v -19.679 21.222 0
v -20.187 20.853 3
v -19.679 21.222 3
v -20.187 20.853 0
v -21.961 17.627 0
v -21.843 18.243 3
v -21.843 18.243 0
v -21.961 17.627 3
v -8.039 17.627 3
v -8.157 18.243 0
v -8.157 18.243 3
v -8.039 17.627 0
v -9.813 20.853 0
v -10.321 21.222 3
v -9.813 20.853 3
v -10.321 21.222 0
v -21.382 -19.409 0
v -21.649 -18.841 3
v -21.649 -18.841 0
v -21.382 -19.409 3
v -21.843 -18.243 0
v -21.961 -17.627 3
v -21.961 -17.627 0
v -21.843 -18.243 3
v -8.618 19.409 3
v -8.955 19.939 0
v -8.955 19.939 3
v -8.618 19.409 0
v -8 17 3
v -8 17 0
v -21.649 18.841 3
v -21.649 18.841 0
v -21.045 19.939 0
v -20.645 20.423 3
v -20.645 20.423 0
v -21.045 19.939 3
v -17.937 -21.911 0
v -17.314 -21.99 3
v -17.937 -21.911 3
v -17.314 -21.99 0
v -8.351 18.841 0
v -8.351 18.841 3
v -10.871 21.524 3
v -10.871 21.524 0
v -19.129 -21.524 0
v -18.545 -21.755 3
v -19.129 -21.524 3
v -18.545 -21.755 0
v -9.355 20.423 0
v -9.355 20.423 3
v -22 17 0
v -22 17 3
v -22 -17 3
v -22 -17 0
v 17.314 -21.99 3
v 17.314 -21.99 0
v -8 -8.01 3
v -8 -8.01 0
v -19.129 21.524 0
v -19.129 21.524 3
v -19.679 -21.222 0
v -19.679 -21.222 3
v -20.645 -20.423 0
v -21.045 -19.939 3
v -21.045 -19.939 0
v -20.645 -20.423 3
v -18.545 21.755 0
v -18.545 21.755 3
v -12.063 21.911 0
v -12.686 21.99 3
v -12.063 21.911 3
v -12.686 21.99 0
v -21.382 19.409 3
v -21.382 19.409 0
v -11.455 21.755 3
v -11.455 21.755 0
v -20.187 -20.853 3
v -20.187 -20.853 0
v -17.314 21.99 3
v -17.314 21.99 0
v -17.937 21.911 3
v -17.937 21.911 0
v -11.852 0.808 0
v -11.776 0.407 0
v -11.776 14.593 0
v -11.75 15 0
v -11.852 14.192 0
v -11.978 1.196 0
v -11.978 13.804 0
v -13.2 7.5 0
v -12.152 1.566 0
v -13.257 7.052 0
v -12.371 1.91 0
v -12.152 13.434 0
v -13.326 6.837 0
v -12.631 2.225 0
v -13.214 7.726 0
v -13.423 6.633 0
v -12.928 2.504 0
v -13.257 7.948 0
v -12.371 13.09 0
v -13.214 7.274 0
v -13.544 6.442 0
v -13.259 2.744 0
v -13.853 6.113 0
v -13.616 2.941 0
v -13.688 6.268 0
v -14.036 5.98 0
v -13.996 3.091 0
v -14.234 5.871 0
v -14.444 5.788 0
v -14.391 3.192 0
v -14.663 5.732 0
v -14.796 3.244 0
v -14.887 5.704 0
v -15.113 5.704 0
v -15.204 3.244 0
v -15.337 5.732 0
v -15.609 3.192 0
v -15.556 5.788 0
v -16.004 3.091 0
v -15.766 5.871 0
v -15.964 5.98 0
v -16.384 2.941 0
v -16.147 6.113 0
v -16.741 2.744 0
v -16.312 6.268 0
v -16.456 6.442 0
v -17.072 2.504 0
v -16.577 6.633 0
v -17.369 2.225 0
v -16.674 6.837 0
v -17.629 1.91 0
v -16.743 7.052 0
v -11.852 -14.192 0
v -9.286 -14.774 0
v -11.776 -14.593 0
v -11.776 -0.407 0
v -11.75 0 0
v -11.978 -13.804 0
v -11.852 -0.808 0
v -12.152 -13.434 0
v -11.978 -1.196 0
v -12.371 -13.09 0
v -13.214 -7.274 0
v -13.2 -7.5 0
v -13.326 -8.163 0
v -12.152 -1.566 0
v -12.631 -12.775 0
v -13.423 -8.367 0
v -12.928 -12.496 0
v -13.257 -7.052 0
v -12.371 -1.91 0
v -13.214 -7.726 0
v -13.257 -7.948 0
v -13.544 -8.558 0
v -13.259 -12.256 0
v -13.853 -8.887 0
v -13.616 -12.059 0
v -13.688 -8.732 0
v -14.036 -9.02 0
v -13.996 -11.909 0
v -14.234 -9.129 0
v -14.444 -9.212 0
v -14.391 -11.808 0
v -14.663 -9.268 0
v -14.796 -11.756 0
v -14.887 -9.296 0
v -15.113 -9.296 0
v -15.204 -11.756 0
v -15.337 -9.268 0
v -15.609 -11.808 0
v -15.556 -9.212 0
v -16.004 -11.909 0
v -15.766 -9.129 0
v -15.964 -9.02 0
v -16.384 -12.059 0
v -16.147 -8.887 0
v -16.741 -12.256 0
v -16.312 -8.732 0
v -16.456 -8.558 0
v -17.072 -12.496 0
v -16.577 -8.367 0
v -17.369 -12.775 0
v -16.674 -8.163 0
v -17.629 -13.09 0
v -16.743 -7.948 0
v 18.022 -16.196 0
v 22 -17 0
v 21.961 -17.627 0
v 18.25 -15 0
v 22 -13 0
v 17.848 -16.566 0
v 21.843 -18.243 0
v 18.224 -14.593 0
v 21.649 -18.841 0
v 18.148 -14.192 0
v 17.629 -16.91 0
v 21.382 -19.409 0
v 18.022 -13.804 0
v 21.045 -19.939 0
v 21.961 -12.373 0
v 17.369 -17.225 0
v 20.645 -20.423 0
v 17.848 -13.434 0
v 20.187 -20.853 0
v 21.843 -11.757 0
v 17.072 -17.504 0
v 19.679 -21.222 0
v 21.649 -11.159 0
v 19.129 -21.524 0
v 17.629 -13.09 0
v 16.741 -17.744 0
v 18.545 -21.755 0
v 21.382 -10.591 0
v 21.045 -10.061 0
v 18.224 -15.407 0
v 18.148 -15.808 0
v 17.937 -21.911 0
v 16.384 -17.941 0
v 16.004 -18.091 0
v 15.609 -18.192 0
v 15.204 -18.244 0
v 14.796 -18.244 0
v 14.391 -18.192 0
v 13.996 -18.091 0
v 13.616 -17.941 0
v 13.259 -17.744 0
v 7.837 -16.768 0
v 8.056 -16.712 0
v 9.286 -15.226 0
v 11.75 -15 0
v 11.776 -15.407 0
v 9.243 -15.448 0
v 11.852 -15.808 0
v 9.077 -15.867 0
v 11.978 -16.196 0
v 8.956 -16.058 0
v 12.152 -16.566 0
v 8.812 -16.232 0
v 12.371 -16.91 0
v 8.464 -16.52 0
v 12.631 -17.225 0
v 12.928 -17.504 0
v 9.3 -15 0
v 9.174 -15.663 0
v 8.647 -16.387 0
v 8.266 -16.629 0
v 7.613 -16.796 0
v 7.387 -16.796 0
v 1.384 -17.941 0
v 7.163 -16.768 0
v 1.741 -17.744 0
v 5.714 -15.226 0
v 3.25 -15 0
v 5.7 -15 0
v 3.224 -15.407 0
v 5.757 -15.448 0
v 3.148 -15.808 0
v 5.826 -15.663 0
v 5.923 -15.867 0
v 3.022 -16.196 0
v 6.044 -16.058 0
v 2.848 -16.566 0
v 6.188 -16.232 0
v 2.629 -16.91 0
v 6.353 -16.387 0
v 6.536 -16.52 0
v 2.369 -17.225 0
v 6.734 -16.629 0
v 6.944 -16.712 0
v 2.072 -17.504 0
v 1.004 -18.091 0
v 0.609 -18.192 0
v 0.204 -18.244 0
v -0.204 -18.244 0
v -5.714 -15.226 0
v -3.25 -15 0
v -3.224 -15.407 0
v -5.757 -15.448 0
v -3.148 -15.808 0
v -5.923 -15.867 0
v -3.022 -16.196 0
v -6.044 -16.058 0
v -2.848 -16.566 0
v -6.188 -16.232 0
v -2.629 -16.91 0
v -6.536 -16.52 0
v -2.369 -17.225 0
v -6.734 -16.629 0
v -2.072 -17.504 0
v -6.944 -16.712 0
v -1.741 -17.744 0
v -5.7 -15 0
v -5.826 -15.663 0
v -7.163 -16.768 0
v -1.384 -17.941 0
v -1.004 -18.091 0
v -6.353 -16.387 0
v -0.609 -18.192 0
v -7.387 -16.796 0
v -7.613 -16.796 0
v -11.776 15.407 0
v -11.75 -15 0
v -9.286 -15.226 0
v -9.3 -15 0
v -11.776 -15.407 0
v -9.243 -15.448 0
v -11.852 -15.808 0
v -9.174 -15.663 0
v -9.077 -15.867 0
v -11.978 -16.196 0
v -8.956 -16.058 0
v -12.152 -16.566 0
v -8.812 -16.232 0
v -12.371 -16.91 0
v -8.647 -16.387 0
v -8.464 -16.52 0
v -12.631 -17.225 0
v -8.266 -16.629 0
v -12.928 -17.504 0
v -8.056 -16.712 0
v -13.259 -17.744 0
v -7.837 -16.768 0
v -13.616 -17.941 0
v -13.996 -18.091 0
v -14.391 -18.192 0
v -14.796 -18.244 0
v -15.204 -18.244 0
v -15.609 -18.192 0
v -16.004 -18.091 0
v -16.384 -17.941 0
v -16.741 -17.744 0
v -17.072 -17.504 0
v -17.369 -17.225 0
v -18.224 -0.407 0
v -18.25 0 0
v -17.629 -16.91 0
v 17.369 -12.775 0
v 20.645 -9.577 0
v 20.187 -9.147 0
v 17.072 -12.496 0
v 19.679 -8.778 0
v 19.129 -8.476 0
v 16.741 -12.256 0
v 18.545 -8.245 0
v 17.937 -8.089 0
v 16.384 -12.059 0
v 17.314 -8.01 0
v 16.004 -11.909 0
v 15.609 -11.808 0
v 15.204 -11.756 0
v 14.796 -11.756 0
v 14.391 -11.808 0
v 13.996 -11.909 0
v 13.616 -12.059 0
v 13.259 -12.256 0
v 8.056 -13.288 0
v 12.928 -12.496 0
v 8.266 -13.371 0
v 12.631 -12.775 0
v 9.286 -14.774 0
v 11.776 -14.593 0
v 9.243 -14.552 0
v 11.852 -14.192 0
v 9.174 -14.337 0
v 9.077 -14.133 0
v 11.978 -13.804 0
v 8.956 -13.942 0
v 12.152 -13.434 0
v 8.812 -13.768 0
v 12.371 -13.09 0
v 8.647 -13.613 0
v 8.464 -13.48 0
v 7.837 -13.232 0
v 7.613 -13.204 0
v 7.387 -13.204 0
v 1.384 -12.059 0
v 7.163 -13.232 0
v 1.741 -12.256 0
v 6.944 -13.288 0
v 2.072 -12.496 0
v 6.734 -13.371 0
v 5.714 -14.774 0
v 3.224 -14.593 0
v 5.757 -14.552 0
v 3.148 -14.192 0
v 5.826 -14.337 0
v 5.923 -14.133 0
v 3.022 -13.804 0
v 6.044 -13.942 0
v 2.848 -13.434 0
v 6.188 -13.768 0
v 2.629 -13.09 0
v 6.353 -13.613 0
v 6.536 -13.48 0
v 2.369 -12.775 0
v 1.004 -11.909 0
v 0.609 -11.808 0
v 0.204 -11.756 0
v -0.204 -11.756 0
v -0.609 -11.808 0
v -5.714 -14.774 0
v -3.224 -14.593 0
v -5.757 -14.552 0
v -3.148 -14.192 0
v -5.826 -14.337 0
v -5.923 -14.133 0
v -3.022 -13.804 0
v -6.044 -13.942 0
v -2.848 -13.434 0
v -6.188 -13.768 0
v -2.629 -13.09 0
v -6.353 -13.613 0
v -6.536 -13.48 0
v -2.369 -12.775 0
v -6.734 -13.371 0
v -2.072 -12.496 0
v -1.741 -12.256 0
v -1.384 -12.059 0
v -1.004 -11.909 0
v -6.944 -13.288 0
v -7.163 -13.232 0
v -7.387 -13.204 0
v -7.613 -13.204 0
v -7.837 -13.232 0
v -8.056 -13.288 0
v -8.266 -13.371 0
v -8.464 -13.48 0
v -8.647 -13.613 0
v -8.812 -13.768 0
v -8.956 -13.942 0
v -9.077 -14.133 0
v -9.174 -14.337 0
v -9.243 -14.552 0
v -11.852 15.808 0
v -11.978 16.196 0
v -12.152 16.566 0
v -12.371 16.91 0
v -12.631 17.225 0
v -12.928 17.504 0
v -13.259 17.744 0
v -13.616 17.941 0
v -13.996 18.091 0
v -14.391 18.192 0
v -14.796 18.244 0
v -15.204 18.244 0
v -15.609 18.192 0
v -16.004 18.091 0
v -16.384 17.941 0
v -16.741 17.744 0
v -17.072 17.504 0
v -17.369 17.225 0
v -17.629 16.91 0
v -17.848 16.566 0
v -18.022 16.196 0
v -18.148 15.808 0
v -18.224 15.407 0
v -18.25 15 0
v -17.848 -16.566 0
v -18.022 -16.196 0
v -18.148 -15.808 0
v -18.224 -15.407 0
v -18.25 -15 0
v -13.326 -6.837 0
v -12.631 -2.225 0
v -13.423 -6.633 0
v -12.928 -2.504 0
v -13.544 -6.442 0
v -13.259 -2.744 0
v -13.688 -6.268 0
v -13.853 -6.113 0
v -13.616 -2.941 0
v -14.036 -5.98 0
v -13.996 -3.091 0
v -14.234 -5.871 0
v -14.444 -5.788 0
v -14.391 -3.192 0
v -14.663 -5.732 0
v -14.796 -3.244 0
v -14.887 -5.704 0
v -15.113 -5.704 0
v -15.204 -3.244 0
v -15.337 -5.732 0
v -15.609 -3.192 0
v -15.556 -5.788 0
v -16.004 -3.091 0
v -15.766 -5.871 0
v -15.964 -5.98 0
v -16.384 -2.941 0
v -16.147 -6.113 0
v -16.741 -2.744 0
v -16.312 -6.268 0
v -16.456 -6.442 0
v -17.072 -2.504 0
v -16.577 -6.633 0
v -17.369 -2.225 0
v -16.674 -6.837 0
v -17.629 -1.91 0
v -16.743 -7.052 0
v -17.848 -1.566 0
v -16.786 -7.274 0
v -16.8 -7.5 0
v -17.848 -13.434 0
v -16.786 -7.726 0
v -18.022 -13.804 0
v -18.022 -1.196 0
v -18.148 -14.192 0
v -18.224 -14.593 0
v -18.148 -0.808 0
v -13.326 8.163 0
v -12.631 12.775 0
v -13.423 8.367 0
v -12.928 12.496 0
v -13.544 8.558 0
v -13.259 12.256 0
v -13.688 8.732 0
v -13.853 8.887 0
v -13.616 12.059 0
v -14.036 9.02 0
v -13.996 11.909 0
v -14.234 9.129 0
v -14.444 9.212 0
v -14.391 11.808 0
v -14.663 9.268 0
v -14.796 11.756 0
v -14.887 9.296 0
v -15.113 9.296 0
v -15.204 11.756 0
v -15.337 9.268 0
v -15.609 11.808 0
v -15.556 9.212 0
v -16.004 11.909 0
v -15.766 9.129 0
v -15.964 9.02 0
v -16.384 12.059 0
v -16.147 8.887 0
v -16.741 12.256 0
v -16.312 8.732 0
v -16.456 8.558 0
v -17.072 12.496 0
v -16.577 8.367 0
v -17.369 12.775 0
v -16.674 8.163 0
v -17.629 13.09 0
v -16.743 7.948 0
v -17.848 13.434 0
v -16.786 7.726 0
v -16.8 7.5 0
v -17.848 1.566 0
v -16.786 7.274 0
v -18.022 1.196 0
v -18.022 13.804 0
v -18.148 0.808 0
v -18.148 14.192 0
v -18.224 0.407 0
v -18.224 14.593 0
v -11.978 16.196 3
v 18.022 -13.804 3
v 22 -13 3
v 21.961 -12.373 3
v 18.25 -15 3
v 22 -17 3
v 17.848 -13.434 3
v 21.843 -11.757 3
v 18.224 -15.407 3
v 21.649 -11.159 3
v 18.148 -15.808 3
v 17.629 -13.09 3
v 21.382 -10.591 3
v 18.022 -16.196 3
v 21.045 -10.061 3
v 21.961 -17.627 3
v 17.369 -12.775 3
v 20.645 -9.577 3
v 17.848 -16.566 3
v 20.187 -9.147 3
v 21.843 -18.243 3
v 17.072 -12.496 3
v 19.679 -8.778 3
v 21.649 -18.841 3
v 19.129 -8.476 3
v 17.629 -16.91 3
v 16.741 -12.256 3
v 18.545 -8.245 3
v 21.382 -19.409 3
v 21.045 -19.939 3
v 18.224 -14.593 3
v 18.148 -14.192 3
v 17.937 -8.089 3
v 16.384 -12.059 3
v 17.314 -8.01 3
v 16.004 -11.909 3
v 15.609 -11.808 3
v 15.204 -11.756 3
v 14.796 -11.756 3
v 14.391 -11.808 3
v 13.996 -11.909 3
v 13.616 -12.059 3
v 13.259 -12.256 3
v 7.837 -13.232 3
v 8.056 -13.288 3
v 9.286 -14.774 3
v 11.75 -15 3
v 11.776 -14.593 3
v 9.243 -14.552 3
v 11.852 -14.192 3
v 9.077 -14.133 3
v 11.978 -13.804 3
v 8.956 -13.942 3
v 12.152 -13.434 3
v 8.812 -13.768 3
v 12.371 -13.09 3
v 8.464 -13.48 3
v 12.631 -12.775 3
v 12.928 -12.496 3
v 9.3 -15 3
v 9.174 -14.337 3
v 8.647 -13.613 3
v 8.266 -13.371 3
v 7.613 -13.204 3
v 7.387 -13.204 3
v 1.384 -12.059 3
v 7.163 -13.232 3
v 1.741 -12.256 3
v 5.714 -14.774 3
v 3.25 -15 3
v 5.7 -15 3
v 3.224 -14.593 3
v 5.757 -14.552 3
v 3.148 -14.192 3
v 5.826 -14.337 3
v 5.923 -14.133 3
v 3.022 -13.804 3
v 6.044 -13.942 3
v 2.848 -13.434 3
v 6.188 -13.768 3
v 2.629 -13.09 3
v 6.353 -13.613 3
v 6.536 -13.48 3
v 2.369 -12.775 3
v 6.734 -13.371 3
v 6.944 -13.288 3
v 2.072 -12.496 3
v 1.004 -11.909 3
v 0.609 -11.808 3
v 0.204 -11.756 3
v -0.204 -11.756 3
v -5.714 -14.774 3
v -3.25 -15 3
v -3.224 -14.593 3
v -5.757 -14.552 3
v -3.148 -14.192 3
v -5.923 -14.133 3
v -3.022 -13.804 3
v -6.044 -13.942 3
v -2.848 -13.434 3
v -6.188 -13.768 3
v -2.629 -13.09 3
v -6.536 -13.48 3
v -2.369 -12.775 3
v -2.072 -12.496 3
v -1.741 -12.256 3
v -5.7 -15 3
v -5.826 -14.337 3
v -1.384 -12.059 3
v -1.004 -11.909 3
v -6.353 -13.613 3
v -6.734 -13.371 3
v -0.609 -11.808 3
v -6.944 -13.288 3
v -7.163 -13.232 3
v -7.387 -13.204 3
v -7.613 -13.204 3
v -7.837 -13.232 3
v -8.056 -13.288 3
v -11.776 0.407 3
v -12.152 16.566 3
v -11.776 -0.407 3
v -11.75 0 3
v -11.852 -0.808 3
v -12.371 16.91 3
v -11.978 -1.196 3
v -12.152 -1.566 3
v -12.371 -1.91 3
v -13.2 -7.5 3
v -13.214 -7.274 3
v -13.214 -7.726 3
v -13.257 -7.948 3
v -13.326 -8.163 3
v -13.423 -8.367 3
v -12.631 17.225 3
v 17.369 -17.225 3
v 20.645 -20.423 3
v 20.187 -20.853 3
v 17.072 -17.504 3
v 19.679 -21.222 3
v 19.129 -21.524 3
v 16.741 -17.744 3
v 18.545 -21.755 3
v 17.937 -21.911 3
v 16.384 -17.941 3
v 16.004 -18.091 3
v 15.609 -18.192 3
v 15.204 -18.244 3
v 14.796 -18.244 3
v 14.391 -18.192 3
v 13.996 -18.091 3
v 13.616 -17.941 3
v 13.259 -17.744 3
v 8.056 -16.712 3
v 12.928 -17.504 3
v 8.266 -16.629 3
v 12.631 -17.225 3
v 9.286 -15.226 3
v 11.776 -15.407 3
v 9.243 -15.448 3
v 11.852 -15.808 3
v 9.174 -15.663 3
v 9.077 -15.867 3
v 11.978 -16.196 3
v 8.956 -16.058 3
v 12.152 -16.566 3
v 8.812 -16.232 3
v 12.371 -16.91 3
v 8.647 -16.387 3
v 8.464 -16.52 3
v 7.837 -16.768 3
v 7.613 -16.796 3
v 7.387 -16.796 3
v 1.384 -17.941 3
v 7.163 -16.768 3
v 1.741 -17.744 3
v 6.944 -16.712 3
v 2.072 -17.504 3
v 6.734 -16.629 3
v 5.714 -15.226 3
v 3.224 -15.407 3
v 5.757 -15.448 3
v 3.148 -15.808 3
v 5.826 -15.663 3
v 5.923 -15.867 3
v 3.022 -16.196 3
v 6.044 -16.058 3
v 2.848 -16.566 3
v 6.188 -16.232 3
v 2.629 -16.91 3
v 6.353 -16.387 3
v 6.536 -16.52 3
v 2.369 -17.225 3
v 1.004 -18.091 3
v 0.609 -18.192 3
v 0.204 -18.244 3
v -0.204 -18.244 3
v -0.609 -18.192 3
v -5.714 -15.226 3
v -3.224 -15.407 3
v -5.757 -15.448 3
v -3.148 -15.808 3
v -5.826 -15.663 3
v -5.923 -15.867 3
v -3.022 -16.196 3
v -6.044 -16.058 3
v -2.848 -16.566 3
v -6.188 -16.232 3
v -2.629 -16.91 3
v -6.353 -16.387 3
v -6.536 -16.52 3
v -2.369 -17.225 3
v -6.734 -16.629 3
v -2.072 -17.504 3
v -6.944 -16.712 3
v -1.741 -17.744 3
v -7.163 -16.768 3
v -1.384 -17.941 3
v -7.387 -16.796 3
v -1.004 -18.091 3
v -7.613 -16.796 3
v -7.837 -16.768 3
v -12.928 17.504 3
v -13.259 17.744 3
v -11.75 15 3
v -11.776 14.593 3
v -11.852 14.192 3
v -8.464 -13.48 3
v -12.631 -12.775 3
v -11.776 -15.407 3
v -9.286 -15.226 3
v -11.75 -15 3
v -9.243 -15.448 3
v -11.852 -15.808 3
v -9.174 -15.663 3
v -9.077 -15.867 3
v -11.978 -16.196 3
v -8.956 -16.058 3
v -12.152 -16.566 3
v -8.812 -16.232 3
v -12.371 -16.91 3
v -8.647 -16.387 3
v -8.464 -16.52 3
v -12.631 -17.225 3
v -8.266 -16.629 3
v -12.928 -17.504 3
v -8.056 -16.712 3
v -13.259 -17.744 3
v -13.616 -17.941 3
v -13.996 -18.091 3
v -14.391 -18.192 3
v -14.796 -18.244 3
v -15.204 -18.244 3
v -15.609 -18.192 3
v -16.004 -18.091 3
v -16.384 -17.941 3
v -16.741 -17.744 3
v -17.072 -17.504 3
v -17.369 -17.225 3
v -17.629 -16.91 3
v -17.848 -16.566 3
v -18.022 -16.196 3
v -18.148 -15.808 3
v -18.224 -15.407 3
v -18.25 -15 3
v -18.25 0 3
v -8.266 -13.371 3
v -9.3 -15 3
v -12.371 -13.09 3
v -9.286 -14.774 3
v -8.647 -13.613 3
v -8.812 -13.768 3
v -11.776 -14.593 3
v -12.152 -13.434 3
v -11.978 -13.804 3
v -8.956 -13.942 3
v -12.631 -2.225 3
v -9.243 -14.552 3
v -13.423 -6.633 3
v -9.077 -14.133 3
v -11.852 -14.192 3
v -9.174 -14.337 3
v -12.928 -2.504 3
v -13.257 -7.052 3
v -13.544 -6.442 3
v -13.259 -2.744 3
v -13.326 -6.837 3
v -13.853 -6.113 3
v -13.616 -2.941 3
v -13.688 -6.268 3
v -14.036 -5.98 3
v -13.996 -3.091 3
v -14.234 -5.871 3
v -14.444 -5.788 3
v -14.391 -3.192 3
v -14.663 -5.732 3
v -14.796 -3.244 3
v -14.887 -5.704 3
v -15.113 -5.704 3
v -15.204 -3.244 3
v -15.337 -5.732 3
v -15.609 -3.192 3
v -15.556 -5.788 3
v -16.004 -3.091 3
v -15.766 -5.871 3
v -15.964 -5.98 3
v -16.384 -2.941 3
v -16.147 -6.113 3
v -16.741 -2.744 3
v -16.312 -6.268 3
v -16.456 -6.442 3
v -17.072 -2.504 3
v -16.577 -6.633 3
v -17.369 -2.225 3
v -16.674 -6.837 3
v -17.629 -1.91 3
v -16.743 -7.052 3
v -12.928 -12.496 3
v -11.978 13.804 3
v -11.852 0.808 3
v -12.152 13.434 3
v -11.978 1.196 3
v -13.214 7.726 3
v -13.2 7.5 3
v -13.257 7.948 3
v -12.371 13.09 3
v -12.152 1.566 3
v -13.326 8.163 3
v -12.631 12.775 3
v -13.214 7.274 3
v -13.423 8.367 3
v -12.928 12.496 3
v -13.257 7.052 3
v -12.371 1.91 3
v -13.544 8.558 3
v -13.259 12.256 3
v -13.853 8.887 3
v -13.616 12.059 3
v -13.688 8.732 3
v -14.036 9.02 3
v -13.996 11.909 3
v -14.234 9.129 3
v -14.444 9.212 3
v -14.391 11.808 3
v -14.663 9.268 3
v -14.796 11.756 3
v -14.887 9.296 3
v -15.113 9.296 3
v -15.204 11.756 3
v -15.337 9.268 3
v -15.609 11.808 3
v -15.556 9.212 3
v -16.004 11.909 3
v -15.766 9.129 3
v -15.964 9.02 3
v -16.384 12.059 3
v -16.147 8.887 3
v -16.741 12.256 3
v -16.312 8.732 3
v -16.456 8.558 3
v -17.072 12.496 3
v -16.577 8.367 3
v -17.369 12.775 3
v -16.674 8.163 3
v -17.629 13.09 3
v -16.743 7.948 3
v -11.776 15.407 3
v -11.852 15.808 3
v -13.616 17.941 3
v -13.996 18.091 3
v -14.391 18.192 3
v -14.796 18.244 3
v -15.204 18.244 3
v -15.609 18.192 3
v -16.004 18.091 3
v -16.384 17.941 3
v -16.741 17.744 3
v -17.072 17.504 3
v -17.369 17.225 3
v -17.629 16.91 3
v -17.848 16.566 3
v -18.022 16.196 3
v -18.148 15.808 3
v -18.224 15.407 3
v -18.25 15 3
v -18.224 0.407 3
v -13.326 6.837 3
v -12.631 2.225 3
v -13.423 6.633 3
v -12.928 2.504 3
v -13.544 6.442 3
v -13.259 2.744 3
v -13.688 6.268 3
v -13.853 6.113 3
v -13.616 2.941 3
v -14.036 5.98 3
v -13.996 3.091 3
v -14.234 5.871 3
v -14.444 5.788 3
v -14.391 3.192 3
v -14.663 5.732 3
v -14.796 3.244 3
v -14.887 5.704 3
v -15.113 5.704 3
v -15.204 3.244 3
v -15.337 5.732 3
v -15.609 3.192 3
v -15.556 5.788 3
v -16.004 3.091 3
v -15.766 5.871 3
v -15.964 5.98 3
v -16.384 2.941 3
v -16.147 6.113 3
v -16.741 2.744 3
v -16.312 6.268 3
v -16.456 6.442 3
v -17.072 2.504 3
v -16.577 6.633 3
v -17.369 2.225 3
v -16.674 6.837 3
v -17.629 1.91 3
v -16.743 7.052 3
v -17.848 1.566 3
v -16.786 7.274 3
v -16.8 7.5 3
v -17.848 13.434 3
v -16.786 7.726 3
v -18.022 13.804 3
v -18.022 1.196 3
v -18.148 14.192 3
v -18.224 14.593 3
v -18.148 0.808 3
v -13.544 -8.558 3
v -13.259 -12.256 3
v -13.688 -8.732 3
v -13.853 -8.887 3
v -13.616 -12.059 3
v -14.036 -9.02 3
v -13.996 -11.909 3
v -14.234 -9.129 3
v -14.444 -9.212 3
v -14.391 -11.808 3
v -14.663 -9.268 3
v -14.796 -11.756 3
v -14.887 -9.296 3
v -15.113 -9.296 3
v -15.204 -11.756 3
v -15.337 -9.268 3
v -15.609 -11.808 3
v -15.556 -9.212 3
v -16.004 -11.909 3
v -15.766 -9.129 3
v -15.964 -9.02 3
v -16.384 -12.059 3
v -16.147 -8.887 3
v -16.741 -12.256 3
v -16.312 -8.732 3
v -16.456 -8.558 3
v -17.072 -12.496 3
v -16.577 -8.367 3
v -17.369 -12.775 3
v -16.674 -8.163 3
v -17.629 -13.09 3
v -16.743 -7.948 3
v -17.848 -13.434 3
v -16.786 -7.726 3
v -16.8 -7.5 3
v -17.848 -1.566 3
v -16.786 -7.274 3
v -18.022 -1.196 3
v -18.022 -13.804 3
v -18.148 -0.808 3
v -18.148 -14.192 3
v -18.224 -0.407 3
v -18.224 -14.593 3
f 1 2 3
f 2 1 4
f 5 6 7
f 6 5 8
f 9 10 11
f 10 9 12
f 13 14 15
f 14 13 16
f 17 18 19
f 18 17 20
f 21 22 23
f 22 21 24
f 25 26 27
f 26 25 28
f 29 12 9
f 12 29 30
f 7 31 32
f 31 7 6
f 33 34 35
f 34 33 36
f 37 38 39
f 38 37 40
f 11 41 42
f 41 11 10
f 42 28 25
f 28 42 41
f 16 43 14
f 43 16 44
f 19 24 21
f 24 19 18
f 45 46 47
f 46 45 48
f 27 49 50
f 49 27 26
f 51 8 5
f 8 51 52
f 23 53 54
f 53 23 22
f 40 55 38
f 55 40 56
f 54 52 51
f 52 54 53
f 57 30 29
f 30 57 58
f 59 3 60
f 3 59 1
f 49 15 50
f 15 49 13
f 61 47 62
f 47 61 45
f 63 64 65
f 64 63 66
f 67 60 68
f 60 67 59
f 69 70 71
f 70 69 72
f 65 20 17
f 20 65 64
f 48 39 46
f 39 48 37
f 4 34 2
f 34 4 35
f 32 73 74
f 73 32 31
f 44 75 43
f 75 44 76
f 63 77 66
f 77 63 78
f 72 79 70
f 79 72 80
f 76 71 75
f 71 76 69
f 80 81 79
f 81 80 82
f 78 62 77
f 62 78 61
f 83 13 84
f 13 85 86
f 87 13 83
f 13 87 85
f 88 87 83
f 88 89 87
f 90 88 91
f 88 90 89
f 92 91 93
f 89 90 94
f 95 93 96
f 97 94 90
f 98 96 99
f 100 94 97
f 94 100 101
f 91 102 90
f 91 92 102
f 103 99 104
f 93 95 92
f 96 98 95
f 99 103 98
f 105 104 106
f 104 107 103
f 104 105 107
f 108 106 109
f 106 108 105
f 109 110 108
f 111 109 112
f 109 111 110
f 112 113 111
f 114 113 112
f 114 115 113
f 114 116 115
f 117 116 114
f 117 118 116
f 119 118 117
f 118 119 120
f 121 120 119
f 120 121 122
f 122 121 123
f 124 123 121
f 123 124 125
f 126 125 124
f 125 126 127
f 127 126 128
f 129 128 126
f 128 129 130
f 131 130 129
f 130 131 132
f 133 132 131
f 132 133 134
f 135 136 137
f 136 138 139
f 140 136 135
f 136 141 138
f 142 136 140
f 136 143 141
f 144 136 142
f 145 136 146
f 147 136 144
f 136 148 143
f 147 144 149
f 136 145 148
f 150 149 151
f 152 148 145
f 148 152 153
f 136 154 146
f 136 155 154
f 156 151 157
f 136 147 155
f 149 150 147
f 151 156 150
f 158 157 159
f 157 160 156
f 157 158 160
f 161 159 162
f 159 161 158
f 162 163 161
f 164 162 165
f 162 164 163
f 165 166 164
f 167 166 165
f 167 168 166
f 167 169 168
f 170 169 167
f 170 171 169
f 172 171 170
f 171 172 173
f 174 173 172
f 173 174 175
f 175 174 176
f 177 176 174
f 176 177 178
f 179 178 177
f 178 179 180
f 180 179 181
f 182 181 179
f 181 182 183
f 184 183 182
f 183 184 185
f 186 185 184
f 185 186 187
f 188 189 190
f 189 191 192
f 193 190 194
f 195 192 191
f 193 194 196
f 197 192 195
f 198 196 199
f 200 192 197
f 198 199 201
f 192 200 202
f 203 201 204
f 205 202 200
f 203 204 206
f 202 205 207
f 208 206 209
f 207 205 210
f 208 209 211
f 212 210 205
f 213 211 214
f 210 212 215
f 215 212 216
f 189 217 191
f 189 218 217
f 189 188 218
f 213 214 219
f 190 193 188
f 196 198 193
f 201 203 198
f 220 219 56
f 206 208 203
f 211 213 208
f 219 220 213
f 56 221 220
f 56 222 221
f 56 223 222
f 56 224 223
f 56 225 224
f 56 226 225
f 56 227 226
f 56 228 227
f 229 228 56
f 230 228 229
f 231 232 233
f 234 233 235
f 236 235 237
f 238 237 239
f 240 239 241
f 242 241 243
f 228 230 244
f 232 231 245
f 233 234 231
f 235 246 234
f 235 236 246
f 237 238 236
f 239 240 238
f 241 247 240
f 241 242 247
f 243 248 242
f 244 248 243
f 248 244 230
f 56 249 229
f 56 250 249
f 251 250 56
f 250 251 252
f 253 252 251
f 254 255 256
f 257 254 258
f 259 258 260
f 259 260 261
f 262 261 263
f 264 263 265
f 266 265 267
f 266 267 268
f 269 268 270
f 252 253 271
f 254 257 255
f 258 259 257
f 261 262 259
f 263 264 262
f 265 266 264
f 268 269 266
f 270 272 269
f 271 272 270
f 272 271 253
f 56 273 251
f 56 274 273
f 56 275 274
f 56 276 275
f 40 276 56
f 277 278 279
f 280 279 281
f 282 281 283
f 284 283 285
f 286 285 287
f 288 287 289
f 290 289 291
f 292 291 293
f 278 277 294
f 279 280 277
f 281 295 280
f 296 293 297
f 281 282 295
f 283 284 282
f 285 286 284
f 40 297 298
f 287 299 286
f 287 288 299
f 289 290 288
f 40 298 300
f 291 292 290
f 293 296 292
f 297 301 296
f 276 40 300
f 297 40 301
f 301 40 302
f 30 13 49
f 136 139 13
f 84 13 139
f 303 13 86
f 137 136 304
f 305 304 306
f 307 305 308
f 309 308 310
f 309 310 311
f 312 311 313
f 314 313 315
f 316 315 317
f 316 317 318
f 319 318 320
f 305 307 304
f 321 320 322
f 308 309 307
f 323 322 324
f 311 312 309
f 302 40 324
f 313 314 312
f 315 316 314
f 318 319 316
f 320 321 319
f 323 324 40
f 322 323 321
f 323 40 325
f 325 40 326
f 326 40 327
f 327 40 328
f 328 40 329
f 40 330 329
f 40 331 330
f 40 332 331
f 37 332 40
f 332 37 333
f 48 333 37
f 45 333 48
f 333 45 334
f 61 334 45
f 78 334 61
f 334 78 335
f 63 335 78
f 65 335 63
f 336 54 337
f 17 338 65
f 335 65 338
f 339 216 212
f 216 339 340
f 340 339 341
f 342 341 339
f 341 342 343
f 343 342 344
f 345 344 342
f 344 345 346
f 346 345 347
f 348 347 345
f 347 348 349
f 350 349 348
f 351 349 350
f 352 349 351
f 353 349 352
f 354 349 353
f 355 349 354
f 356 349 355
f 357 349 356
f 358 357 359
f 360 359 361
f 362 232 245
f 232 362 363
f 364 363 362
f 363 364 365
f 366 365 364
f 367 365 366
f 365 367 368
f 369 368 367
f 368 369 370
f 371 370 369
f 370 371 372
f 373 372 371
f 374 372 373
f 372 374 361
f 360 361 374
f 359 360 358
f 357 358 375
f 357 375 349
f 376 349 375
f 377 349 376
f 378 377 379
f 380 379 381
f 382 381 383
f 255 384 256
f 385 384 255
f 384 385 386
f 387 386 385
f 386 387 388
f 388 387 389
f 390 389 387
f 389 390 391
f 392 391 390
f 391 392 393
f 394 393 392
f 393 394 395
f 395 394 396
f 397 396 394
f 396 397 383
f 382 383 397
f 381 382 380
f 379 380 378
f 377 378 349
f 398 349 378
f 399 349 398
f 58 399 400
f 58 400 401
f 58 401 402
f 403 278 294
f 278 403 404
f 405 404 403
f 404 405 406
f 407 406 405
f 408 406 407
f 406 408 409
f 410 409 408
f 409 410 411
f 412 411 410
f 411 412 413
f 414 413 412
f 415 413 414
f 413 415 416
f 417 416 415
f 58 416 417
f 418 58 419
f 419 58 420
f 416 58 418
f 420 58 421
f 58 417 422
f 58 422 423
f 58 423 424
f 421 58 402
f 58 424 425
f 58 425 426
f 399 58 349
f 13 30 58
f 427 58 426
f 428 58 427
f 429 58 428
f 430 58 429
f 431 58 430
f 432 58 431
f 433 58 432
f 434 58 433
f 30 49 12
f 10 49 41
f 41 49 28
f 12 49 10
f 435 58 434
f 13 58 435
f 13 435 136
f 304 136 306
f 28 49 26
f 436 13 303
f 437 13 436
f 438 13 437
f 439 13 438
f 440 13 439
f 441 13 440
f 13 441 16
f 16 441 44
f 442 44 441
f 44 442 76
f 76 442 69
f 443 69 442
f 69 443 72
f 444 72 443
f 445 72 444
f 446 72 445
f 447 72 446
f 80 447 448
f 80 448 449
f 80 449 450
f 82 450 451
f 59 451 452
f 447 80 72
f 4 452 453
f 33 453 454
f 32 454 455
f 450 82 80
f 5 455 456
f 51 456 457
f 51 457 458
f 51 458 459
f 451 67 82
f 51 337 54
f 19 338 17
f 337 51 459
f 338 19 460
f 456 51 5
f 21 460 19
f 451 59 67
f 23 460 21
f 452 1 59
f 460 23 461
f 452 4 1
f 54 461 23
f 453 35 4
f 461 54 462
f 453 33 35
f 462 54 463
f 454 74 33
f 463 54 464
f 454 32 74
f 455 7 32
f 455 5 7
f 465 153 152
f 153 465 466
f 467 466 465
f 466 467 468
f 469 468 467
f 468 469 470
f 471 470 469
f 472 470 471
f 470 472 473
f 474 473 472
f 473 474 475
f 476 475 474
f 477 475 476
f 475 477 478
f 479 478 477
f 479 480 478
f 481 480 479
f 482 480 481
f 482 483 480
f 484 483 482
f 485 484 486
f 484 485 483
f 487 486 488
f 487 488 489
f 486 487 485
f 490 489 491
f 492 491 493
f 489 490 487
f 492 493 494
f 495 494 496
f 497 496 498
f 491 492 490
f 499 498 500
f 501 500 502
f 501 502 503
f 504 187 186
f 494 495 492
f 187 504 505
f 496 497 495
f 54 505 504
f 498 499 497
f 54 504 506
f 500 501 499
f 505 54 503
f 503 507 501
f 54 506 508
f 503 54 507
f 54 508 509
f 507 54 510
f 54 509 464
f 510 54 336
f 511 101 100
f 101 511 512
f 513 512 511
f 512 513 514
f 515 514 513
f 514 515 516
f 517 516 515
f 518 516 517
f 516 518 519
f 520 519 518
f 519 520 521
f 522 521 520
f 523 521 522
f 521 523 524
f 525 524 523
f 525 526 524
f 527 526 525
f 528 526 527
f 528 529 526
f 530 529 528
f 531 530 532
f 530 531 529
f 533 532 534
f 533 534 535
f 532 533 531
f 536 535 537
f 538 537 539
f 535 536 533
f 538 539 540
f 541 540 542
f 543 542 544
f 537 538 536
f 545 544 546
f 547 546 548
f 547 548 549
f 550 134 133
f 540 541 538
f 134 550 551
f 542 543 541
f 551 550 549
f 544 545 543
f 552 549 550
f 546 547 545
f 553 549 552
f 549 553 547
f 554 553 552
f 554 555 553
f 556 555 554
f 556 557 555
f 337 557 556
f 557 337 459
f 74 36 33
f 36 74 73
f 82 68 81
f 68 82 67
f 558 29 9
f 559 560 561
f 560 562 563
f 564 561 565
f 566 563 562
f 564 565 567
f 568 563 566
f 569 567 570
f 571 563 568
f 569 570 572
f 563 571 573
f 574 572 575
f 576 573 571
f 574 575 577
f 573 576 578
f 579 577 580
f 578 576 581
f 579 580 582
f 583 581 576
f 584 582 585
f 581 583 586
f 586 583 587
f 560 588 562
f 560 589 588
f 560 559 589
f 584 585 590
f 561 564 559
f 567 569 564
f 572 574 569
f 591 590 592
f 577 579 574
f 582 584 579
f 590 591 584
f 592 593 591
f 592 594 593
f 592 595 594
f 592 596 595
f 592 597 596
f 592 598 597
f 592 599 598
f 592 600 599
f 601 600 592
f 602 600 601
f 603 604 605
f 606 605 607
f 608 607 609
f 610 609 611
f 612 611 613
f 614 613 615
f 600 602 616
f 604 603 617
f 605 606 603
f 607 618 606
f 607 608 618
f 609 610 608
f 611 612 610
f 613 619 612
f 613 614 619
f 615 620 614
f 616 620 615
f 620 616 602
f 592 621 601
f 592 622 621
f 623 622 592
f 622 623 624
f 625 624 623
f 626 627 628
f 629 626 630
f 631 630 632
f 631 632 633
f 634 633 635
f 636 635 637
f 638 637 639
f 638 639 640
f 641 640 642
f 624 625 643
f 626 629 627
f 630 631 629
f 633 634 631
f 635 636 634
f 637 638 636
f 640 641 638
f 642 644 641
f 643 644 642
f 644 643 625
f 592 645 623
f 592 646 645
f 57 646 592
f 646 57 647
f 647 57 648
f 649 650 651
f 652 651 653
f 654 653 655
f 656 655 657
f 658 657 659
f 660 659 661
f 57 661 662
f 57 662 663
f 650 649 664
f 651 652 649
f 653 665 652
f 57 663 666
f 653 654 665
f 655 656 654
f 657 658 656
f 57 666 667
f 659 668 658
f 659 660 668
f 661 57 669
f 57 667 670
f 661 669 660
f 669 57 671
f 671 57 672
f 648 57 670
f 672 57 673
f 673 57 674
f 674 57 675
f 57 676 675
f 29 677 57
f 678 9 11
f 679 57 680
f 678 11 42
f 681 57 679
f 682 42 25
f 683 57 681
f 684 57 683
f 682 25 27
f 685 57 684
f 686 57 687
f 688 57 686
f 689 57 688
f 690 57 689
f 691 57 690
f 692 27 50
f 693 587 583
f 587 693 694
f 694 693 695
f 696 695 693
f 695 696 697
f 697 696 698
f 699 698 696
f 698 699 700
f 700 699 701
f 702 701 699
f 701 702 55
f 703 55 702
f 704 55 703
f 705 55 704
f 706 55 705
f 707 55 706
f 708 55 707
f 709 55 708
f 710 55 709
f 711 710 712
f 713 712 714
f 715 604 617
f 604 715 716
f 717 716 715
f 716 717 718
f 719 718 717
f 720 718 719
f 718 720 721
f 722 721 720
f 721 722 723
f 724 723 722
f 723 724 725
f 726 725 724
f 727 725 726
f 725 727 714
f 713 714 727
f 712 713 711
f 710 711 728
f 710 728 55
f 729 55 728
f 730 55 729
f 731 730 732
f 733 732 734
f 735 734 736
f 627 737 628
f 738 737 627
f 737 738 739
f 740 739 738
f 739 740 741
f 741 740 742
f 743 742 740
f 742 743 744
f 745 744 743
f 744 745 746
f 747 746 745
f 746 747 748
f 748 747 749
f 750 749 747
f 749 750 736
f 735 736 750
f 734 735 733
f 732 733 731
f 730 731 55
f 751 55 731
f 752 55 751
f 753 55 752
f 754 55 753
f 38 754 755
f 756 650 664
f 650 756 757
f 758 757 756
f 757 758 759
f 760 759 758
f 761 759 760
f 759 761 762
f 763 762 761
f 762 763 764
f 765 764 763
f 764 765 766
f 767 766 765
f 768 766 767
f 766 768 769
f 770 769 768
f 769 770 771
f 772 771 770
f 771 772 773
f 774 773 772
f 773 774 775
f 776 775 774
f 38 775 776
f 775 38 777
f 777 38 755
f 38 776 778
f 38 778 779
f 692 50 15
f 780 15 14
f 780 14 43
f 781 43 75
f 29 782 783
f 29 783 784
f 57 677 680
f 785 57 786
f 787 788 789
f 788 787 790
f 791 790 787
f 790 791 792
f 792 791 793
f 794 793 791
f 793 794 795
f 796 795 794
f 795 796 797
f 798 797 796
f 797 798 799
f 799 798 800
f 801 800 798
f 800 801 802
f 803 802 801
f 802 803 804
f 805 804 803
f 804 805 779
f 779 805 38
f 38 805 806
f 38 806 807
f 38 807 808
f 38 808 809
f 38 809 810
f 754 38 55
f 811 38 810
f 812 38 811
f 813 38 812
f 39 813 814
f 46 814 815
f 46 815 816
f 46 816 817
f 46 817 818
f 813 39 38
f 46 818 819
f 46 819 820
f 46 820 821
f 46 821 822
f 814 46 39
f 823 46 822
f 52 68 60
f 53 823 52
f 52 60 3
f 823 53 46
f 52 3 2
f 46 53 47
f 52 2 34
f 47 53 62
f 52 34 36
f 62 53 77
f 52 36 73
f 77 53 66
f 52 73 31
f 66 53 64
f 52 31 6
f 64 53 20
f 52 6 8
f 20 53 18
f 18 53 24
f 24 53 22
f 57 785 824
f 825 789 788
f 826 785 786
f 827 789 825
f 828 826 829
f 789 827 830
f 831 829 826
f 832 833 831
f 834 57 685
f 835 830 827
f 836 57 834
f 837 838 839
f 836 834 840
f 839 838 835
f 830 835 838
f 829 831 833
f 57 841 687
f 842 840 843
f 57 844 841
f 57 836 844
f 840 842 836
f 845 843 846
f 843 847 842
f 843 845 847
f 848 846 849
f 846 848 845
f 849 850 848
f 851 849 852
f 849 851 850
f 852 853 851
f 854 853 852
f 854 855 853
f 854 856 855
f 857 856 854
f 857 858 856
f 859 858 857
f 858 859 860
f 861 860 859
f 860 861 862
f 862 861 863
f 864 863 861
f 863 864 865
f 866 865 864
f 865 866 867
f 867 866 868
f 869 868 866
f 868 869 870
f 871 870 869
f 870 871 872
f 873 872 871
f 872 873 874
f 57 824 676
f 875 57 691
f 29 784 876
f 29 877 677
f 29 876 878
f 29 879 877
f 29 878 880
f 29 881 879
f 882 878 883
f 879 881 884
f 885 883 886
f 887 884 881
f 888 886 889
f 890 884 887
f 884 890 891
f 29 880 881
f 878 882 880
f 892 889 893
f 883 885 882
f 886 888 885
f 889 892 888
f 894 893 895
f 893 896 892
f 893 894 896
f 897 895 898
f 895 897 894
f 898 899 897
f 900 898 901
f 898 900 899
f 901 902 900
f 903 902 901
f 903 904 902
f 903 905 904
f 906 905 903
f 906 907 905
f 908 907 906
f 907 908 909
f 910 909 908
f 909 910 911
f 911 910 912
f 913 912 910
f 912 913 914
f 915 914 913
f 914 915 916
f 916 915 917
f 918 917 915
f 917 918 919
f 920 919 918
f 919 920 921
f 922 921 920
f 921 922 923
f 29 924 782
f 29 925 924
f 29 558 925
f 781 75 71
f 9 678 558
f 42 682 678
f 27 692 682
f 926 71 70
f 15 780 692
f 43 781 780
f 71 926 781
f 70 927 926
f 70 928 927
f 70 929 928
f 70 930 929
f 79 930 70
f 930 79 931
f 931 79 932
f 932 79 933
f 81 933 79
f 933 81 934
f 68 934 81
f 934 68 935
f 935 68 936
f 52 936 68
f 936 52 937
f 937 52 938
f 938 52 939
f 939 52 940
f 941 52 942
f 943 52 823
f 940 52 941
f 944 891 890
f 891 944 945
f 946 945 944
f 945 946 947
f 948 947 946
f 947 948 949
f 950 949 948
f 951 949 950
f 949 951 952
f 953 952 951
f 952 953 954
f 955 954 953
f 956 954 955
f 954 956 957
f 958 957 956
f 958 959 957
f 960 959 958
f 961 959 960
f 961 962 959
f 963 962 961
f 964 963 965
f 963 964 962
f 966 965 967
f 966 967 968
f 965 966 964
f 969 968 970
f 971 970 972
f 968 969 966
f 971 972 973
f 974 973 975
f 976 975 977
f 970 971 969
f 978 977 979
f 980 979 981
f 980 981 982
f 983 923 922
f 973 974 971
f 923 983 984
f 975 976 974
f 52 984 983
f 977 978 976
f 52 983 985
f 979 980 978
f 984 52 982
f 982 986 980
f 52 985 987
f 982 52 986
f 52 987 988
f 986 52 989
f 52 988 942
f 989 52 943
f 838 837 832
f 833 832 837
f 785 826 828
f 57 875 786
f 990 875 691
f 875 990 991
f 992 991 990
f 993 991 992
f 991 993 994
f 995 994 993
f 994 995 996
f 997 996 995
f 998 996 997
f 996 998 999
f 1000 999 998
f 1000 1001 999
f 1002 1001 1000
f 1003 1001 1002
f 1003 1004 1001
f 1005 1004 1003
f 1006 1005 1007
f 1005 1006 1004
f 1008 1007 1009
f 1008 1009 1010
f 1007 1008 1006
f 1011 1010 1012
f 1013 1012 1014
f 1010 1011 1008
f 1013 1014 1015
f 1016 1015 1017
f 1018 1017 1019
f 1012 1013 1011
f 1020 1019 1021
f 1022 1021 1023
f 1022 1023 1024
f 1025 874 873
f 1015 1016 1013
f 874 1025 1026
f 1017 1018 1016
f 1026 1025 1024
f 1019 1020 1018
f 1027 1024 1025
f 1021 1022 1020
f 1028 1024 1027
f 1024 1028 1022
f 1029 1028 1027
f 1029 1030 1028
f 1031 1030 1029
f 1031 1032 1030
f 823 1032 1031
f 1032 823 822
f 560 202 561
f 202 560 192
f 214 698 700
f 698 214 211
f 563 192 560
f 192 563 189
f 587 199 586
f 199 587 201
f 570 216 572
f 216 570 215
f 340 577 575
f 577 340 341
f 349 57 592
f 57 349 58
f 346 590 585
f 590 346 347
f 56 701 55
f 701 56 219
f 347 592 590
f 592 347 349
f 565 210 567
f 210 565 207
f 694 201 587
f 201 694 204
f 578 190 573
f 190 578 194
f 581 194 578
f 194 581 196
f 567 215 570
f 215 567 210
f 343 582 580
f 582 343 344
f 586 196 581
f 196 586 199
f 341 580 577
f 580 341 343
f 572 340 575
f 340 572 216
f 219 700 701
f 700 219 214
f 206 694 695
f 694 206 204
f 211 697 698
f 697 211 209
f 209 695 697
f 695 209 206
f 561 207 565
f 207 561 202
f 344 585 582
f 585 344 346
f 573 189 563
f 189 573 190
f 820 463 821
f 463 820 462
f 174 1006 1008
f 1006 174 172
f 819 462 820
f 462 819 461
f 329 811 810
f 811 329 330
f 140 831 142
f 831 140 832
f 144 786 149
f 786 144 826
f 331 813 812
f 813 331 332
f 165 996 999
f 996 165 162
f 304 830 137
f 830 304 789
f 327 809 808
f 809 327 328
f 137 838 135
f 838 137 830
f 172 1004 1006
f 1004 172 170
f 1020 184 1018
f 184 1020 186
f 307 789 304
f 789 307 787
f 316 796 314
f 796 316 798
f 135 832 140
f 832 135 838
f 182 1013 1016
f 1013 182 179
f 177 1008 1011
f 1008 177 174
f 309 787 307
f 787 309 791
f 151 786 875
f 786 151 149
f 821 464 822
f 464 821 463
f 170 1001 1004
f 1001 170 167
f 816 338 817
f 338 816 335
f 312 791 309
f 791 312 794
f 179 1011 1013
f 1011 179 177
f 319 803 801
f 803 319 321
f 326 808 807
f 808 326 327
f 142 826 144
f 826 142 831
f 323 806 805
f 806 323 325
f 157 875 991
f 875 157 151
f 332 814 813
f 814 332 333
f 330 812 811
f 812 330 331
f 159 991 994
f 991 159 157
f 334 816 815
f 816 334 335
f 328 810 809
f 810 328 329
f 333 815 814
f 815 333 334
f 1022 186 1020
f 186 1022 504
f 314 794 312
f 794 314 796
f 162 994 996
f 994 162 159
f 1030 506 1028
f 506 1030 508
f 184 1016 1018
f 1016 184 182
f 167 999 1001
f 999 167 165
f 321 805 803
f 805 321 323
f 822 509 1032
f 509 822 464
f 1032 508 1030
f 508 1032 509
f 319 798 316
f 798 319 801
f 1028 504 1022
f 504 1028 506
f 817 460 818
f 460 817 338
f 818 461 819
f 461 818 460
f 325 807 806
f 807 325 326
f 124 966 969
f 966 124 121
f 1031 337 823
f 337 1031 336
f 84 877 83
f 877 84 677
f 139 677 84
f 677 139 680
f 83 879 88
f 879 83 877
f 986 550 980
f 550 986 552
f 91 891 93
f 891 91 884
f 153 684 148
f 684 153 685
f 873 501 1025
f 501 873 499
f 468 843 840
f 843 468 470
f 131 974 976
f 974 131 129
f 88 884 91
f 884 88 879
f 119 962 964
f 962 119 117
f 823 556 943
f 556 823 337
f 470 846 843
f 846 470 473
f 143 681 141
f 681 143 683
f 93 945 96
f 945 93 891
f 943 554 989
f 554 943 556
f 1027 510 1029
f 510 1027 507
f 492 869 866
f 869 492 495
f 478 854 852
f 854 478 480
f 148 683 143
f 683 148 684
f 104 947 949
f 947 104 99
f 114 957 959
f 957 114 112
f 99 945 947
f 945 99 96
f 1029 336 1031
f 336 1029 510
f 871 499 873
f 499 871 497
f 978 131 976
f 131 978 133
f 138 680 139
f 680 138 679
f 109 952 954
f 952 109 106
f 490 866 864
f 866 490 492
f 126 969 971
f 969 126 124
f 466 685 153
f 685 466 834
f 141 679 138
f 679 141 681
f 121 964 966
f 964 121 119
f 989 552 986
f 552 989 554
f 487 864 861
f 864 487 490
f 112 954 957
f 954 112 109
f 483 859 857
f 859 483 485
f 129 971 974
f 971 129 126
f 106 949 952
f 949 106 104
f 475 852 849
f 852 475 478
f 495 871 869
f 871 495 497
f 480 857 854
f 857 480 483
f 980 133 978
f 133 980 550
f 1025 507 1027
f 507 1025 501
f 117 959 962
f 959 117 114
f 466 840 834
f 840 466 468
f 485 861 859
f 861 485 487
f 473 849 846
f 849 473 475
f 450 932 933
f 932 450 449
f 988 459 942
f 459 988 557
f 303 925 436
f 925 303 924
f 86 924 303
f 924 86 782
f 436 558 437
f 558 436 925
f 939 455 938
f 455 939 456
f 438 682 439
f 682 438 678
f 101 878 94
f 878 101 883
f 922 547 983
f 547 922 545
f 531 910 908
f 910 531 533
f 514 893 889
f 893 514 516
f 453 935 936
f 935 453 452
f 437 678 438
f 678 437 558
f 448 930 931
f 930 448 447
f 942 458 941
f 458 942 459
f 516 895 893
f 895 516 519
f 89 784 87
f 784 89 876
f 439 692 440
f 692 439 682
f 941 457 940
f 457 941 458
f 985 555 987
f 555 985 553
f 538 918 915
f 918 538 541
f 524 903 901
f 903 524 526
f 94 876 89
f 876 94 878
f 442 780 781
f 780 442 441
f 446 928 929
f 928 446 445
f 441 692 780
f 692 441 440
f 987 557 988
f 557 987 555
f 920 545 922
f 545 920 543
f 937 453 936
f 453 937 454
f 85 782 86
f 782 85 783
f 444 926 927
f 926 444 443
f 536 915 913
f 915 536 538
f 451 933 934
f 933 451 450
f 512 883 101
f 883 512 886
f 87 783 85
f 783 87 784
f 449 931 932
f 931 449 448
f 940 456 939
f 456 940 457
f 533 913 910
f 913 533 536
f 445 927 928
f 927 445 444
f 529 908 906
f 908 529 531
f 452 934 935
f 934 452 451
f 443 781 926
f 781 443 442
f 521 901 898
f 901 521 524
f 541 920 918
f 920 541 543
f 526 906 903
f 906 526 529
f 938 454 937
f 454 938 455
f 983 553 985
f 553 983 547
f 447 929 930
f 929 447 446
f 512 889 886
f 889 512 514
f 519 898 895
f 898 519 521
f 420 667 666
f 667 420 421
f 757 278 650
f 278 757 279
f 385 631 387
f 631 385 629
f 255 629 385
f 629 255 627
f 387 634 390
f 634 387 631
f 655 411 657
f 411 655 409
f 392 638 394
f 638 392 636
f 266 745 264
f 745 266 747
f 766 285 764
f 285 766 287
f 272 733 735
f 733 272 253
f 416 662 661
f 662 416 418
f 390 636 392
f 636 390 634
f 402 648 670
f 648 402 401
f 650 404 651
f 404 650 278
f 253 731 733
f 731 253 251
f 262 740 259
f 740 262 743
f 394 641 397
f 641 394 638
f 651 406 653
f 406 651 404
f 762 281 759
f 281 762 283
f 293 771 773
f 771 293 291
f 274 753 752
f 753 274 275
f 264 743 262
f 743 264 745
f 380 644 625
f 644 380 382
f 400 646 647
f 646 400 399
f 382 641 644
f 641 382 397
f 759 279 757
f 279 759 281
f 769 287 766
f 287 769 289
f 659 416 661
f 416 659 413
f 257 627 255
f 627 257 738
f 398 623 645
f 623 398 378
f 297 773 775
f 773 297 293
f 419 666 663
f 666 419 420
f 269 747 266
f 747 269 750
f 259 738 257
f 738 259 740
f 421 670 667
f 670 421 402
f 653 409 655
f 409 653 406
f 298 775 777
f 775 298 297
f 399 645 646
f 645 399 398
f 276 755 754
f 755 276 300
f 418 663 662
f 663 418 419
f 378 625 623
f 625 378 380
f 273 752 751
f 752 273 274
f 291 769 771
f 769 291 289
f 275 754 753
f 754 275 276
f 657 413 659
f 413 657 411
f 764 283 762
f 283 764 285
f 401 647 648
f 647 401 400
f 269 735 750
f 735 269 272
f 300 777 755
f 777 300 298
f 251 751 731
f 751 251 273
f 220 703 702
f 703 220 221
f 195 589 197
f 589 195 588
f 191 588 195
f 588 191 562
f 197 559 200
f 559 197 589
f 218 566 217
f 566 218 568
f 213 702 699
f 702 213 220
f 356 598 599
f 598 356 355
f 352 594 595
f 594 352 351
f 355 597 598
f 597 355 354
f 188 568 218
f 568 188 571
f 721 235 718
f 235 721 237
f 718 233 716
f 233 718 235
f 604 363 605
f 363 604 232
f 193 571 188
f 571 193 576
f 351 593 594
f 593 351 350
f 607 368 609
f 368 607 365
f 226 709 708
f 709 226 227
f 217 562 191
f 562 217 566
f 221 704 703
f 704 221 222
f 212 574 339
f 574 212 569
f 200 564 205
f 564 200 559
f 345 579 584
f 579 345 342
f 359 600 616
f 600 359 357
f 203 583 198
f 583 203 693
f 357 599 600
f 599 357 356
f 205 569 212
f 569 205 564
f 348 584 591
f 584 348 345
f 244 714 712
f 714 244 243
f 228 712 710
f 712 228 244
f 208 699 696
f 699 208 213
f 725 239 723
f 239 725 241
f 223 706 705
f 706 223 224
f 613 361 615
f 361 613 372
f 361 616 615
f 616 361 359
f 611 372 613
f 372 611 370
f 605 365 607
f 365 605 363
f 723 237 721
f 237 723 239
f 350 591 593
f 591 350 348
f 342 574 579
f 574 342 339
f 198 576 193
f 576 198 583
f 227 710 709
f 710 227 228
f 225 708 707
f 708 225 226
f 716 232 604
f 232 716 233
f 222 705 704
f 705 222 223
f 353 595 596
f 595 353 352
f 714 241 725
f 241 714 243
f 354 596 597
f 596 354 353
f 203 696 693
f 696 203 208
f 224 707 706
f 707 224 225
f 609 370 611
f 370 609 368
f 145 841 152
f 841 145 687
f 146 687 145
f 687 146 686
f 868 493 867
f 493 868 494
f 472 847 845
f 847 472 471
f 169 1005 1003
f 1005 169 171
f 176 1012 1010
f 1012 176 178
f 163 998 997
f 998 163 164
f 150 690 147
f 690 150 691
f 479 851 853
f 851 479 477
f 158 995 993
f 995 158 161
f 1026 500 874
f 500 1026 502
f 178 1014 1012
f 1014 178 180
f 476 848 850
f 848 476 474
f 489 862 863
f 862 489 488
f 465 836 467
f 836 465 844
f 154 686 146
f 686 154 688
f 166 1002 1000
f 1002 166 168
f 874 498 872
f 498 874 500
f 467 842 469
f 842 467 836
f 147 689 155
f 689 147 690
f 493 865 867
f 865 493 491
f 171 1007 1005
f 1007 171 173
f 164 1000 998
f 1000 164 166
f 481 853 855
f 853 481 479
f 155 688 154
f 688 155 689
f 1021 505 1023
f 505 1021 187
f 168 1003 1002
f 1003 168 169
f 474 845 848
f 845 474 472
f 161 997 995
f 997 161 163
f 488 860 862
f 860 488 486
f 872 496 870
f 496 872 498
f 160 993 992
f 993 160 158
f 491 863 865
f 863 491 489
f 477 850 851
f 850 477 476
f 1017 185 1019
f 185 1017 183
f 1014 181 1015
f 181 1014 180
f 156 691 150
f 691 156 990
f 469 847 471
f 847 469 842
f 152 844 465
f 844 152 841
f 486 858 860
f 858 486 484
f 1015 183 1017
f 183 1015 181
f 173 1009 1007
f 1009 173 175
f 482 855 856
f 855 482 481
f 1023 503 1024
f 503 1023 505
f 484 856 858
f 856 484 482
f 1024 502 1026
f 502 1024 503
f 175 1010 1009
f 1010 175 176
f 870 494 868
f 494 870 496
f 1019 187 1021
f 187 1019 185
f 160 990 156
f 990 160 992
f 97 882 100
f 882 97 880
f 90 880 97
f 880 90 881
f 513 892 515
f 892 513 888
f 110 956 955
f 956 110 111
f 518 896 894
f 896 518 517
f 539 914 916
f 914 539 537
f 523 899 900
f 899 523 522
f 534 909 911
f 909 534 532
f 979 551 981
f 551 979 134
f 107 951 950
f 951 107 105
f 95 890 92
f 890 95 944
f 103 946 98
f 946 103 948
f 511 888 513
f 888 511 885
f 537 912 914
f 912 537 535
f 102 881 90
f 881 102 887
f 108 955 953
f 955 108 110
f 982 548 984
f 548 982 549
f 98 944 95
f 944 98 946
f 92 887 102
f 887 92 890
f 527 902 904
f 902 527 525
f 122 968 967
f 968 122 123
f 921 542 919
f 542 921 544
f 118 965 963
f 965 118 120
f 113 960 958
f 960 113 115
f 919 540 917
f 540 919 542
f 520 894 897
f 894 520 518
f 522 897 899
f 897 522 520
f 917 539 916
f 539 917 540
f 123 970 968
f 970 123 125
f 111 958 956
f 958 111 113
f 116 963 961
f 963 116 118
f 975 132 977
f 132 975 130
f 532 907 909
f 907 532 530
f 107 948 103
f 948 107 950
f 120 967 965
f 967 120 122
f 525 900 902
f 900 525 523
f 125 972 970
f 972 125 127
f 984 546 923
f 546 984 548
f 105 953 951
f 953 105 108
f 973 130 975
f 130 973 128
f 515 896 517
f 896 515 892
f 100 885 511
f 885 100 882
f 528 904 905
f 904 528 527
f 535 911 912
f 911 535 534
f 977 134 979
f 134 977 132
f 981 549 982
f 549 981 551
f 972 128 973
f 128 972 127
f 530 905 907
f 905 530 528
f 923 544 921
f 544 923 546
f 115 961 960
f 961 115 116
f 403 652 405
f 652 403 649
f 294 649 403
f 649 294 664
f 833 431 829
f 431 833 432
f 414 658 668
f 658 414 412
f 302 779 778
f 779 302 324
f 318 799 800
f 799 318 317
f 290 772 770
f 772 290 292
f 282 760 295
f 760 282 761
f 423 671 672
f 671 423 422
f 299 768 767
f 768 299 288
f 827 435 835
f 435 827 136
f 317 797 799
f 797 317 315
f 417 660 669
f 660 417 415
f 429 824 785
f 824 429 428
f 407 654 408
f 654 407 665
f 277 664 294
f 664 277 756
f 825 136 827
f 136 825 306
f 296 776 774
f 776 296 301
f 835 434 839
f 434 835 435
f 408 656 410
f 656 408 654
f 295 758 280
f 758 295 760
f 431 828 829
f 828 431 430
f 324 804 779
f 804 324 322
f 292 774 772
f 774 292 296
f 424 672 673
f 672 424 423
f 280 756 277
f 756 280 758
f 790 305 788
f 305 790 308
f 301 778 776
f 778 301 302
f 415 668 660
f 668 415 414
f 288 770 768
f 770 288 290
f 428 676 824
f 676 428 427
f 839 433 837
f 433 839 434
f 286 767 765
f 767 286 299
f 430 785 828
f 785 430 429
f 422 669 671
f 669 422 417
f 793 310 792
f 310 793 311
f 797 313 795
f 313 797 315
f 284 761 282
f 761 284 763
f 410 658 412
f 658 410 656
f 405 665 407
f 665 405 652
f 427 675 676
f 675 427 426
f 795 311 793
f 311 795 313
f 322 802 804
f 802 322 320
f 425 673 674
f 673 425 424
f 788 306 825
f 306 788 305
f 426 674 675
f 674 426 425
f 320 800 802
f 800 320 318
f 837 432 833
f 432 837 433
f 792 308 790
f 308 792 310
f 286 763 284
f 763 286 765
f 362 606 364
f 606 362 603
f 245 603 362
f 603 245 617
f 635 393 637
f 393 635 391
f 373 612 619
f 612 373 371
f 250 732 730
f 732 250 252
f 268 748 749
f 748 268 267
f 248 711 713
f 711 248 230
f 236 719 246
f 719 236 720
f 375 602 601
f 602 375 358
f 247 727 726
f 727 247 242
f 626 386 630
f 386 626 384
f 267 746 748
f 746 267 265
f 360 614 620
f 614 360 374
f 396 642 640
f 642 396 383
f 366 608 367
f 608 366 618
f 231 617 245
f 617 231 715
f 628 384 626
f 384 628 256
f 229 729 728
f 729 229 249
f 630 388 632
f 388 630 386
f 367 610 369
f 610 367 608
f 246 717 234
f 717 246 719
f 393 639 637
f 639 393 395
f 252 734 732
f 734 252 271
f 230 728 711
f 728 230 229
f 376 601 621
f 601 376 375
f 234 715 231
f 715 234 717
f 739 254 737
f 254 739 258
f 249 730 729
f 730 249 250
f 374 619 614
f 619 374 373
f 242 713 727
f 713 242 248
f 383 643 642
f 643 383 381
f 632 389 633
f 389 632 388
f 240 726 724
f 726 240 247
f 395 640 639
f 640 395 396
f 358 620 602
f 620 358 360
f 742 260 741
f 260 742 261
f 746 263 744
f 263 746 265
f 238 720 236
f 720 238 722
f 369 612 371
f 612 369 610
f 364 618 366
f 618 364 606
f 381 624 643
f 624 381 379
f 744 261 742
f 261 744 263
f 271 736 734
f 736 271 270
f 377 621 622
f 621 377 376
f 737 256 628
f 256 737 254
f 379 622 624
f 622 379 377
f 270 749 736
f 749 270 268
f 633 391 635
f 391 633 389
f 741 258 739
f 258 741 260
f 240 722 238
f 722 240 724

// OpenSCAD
$fn = 50;

difference() {
	union() {
		translate(v = [-15.0, 0, 0]) {
			hull() {
				translate(v = [-2.0, 17.0, 0]) {
					cylinder(h = 3, r = 5);
				}
				translate(v = [2.0, 17.0, 0]) {
					cylinder(h = 3, r = 5);
				}
				translate(v = [-2.0, -17.0, 0]) {
					cylinder(h = 3, r = 5);
				}
				translate(v = [2.0, -17.0, 0]) {
					cylinder(h = 3, r = 5);
				}
			}
		}
		translate(v = [0, -15.0, 0]) {
			hull() {
				translate(v = [-17.0, 2.0, 0]) {
					cylinder(h = 3, r = 5);
				}
				translate(v = [17.0, 2.0, 0]) {
					cylinder(h = 3, r = 5);
				}
				translate(v = [-17.0, -2.0, 0]) {
					cylinder(h = 3, r = 5);
				}
				translate(v = [17.0, -2.0, 0]) {
					cylinder(h = 3, r = 5);
				}
			}
		}
	}
	union() {
		translate(v = [-15.0, -15.0, 0]) {
			cylinder(h = 3, r = 3.25);
		}
		translate(v = [-15.0, 0.0, 0]) {
			cylinder(h = 3, r = 3.25);
		}
		translate(v = [-15.0, 15.0, 0]) {
			cylinder(h = 3, r = 3.25);
		}
		translate(v = [-15.0, -15.0, 0]) {
			cylinder(h = 3, r = 3.25);
		}
		translate(v = [0.0, -15.0, 0]) {
			cylinder(h = 3, r = 3.25);
		}
		translate(v = [15.0, -15.0, 0]) {
			cylinder(h = 3, r = 3.25);
		}
		translate(v = [-15.0, -15.0, 0]) {
			cylinder(h = 3, r = 1.8);
		}
		translate(v = [-15.0, -7.5, 0]) {
			cylinder(h = 3, r = 1.8);
		}
		translate(v = [-15.0, 0.0, 0]) {
			cylinder(h = 3, r = 1.8);
		}
		translate(v = [-15.0, 7.5, 0]) {
			cylinder(h = 3, r = 1.8);
		}
		translate(v = [-15.0, 15.0, 0]) {
			cylinder(h = 3, r = 1.8);
		}
		translate(v = [-15.0, -15.0, 0]) {
			cylinder(h = 3, r = 1.8);
		}
		translate(v = [-7.5, -15.0, 0]) {
			cylinder(h = 3, r = 1.8);
		}
		translate(v = [0.0, -15.0, 0]) {
			cylinder(h = 3, r = 1.8);
		}
		translate(v = [7.5, -15.0, 0]) {
			cylinder(h = 3, r = 1.8);
		}
		translate(v = [15.0, -15.0, 0]) {
			cylinder(h = 3, r = 1.8);
		}
	}
}
